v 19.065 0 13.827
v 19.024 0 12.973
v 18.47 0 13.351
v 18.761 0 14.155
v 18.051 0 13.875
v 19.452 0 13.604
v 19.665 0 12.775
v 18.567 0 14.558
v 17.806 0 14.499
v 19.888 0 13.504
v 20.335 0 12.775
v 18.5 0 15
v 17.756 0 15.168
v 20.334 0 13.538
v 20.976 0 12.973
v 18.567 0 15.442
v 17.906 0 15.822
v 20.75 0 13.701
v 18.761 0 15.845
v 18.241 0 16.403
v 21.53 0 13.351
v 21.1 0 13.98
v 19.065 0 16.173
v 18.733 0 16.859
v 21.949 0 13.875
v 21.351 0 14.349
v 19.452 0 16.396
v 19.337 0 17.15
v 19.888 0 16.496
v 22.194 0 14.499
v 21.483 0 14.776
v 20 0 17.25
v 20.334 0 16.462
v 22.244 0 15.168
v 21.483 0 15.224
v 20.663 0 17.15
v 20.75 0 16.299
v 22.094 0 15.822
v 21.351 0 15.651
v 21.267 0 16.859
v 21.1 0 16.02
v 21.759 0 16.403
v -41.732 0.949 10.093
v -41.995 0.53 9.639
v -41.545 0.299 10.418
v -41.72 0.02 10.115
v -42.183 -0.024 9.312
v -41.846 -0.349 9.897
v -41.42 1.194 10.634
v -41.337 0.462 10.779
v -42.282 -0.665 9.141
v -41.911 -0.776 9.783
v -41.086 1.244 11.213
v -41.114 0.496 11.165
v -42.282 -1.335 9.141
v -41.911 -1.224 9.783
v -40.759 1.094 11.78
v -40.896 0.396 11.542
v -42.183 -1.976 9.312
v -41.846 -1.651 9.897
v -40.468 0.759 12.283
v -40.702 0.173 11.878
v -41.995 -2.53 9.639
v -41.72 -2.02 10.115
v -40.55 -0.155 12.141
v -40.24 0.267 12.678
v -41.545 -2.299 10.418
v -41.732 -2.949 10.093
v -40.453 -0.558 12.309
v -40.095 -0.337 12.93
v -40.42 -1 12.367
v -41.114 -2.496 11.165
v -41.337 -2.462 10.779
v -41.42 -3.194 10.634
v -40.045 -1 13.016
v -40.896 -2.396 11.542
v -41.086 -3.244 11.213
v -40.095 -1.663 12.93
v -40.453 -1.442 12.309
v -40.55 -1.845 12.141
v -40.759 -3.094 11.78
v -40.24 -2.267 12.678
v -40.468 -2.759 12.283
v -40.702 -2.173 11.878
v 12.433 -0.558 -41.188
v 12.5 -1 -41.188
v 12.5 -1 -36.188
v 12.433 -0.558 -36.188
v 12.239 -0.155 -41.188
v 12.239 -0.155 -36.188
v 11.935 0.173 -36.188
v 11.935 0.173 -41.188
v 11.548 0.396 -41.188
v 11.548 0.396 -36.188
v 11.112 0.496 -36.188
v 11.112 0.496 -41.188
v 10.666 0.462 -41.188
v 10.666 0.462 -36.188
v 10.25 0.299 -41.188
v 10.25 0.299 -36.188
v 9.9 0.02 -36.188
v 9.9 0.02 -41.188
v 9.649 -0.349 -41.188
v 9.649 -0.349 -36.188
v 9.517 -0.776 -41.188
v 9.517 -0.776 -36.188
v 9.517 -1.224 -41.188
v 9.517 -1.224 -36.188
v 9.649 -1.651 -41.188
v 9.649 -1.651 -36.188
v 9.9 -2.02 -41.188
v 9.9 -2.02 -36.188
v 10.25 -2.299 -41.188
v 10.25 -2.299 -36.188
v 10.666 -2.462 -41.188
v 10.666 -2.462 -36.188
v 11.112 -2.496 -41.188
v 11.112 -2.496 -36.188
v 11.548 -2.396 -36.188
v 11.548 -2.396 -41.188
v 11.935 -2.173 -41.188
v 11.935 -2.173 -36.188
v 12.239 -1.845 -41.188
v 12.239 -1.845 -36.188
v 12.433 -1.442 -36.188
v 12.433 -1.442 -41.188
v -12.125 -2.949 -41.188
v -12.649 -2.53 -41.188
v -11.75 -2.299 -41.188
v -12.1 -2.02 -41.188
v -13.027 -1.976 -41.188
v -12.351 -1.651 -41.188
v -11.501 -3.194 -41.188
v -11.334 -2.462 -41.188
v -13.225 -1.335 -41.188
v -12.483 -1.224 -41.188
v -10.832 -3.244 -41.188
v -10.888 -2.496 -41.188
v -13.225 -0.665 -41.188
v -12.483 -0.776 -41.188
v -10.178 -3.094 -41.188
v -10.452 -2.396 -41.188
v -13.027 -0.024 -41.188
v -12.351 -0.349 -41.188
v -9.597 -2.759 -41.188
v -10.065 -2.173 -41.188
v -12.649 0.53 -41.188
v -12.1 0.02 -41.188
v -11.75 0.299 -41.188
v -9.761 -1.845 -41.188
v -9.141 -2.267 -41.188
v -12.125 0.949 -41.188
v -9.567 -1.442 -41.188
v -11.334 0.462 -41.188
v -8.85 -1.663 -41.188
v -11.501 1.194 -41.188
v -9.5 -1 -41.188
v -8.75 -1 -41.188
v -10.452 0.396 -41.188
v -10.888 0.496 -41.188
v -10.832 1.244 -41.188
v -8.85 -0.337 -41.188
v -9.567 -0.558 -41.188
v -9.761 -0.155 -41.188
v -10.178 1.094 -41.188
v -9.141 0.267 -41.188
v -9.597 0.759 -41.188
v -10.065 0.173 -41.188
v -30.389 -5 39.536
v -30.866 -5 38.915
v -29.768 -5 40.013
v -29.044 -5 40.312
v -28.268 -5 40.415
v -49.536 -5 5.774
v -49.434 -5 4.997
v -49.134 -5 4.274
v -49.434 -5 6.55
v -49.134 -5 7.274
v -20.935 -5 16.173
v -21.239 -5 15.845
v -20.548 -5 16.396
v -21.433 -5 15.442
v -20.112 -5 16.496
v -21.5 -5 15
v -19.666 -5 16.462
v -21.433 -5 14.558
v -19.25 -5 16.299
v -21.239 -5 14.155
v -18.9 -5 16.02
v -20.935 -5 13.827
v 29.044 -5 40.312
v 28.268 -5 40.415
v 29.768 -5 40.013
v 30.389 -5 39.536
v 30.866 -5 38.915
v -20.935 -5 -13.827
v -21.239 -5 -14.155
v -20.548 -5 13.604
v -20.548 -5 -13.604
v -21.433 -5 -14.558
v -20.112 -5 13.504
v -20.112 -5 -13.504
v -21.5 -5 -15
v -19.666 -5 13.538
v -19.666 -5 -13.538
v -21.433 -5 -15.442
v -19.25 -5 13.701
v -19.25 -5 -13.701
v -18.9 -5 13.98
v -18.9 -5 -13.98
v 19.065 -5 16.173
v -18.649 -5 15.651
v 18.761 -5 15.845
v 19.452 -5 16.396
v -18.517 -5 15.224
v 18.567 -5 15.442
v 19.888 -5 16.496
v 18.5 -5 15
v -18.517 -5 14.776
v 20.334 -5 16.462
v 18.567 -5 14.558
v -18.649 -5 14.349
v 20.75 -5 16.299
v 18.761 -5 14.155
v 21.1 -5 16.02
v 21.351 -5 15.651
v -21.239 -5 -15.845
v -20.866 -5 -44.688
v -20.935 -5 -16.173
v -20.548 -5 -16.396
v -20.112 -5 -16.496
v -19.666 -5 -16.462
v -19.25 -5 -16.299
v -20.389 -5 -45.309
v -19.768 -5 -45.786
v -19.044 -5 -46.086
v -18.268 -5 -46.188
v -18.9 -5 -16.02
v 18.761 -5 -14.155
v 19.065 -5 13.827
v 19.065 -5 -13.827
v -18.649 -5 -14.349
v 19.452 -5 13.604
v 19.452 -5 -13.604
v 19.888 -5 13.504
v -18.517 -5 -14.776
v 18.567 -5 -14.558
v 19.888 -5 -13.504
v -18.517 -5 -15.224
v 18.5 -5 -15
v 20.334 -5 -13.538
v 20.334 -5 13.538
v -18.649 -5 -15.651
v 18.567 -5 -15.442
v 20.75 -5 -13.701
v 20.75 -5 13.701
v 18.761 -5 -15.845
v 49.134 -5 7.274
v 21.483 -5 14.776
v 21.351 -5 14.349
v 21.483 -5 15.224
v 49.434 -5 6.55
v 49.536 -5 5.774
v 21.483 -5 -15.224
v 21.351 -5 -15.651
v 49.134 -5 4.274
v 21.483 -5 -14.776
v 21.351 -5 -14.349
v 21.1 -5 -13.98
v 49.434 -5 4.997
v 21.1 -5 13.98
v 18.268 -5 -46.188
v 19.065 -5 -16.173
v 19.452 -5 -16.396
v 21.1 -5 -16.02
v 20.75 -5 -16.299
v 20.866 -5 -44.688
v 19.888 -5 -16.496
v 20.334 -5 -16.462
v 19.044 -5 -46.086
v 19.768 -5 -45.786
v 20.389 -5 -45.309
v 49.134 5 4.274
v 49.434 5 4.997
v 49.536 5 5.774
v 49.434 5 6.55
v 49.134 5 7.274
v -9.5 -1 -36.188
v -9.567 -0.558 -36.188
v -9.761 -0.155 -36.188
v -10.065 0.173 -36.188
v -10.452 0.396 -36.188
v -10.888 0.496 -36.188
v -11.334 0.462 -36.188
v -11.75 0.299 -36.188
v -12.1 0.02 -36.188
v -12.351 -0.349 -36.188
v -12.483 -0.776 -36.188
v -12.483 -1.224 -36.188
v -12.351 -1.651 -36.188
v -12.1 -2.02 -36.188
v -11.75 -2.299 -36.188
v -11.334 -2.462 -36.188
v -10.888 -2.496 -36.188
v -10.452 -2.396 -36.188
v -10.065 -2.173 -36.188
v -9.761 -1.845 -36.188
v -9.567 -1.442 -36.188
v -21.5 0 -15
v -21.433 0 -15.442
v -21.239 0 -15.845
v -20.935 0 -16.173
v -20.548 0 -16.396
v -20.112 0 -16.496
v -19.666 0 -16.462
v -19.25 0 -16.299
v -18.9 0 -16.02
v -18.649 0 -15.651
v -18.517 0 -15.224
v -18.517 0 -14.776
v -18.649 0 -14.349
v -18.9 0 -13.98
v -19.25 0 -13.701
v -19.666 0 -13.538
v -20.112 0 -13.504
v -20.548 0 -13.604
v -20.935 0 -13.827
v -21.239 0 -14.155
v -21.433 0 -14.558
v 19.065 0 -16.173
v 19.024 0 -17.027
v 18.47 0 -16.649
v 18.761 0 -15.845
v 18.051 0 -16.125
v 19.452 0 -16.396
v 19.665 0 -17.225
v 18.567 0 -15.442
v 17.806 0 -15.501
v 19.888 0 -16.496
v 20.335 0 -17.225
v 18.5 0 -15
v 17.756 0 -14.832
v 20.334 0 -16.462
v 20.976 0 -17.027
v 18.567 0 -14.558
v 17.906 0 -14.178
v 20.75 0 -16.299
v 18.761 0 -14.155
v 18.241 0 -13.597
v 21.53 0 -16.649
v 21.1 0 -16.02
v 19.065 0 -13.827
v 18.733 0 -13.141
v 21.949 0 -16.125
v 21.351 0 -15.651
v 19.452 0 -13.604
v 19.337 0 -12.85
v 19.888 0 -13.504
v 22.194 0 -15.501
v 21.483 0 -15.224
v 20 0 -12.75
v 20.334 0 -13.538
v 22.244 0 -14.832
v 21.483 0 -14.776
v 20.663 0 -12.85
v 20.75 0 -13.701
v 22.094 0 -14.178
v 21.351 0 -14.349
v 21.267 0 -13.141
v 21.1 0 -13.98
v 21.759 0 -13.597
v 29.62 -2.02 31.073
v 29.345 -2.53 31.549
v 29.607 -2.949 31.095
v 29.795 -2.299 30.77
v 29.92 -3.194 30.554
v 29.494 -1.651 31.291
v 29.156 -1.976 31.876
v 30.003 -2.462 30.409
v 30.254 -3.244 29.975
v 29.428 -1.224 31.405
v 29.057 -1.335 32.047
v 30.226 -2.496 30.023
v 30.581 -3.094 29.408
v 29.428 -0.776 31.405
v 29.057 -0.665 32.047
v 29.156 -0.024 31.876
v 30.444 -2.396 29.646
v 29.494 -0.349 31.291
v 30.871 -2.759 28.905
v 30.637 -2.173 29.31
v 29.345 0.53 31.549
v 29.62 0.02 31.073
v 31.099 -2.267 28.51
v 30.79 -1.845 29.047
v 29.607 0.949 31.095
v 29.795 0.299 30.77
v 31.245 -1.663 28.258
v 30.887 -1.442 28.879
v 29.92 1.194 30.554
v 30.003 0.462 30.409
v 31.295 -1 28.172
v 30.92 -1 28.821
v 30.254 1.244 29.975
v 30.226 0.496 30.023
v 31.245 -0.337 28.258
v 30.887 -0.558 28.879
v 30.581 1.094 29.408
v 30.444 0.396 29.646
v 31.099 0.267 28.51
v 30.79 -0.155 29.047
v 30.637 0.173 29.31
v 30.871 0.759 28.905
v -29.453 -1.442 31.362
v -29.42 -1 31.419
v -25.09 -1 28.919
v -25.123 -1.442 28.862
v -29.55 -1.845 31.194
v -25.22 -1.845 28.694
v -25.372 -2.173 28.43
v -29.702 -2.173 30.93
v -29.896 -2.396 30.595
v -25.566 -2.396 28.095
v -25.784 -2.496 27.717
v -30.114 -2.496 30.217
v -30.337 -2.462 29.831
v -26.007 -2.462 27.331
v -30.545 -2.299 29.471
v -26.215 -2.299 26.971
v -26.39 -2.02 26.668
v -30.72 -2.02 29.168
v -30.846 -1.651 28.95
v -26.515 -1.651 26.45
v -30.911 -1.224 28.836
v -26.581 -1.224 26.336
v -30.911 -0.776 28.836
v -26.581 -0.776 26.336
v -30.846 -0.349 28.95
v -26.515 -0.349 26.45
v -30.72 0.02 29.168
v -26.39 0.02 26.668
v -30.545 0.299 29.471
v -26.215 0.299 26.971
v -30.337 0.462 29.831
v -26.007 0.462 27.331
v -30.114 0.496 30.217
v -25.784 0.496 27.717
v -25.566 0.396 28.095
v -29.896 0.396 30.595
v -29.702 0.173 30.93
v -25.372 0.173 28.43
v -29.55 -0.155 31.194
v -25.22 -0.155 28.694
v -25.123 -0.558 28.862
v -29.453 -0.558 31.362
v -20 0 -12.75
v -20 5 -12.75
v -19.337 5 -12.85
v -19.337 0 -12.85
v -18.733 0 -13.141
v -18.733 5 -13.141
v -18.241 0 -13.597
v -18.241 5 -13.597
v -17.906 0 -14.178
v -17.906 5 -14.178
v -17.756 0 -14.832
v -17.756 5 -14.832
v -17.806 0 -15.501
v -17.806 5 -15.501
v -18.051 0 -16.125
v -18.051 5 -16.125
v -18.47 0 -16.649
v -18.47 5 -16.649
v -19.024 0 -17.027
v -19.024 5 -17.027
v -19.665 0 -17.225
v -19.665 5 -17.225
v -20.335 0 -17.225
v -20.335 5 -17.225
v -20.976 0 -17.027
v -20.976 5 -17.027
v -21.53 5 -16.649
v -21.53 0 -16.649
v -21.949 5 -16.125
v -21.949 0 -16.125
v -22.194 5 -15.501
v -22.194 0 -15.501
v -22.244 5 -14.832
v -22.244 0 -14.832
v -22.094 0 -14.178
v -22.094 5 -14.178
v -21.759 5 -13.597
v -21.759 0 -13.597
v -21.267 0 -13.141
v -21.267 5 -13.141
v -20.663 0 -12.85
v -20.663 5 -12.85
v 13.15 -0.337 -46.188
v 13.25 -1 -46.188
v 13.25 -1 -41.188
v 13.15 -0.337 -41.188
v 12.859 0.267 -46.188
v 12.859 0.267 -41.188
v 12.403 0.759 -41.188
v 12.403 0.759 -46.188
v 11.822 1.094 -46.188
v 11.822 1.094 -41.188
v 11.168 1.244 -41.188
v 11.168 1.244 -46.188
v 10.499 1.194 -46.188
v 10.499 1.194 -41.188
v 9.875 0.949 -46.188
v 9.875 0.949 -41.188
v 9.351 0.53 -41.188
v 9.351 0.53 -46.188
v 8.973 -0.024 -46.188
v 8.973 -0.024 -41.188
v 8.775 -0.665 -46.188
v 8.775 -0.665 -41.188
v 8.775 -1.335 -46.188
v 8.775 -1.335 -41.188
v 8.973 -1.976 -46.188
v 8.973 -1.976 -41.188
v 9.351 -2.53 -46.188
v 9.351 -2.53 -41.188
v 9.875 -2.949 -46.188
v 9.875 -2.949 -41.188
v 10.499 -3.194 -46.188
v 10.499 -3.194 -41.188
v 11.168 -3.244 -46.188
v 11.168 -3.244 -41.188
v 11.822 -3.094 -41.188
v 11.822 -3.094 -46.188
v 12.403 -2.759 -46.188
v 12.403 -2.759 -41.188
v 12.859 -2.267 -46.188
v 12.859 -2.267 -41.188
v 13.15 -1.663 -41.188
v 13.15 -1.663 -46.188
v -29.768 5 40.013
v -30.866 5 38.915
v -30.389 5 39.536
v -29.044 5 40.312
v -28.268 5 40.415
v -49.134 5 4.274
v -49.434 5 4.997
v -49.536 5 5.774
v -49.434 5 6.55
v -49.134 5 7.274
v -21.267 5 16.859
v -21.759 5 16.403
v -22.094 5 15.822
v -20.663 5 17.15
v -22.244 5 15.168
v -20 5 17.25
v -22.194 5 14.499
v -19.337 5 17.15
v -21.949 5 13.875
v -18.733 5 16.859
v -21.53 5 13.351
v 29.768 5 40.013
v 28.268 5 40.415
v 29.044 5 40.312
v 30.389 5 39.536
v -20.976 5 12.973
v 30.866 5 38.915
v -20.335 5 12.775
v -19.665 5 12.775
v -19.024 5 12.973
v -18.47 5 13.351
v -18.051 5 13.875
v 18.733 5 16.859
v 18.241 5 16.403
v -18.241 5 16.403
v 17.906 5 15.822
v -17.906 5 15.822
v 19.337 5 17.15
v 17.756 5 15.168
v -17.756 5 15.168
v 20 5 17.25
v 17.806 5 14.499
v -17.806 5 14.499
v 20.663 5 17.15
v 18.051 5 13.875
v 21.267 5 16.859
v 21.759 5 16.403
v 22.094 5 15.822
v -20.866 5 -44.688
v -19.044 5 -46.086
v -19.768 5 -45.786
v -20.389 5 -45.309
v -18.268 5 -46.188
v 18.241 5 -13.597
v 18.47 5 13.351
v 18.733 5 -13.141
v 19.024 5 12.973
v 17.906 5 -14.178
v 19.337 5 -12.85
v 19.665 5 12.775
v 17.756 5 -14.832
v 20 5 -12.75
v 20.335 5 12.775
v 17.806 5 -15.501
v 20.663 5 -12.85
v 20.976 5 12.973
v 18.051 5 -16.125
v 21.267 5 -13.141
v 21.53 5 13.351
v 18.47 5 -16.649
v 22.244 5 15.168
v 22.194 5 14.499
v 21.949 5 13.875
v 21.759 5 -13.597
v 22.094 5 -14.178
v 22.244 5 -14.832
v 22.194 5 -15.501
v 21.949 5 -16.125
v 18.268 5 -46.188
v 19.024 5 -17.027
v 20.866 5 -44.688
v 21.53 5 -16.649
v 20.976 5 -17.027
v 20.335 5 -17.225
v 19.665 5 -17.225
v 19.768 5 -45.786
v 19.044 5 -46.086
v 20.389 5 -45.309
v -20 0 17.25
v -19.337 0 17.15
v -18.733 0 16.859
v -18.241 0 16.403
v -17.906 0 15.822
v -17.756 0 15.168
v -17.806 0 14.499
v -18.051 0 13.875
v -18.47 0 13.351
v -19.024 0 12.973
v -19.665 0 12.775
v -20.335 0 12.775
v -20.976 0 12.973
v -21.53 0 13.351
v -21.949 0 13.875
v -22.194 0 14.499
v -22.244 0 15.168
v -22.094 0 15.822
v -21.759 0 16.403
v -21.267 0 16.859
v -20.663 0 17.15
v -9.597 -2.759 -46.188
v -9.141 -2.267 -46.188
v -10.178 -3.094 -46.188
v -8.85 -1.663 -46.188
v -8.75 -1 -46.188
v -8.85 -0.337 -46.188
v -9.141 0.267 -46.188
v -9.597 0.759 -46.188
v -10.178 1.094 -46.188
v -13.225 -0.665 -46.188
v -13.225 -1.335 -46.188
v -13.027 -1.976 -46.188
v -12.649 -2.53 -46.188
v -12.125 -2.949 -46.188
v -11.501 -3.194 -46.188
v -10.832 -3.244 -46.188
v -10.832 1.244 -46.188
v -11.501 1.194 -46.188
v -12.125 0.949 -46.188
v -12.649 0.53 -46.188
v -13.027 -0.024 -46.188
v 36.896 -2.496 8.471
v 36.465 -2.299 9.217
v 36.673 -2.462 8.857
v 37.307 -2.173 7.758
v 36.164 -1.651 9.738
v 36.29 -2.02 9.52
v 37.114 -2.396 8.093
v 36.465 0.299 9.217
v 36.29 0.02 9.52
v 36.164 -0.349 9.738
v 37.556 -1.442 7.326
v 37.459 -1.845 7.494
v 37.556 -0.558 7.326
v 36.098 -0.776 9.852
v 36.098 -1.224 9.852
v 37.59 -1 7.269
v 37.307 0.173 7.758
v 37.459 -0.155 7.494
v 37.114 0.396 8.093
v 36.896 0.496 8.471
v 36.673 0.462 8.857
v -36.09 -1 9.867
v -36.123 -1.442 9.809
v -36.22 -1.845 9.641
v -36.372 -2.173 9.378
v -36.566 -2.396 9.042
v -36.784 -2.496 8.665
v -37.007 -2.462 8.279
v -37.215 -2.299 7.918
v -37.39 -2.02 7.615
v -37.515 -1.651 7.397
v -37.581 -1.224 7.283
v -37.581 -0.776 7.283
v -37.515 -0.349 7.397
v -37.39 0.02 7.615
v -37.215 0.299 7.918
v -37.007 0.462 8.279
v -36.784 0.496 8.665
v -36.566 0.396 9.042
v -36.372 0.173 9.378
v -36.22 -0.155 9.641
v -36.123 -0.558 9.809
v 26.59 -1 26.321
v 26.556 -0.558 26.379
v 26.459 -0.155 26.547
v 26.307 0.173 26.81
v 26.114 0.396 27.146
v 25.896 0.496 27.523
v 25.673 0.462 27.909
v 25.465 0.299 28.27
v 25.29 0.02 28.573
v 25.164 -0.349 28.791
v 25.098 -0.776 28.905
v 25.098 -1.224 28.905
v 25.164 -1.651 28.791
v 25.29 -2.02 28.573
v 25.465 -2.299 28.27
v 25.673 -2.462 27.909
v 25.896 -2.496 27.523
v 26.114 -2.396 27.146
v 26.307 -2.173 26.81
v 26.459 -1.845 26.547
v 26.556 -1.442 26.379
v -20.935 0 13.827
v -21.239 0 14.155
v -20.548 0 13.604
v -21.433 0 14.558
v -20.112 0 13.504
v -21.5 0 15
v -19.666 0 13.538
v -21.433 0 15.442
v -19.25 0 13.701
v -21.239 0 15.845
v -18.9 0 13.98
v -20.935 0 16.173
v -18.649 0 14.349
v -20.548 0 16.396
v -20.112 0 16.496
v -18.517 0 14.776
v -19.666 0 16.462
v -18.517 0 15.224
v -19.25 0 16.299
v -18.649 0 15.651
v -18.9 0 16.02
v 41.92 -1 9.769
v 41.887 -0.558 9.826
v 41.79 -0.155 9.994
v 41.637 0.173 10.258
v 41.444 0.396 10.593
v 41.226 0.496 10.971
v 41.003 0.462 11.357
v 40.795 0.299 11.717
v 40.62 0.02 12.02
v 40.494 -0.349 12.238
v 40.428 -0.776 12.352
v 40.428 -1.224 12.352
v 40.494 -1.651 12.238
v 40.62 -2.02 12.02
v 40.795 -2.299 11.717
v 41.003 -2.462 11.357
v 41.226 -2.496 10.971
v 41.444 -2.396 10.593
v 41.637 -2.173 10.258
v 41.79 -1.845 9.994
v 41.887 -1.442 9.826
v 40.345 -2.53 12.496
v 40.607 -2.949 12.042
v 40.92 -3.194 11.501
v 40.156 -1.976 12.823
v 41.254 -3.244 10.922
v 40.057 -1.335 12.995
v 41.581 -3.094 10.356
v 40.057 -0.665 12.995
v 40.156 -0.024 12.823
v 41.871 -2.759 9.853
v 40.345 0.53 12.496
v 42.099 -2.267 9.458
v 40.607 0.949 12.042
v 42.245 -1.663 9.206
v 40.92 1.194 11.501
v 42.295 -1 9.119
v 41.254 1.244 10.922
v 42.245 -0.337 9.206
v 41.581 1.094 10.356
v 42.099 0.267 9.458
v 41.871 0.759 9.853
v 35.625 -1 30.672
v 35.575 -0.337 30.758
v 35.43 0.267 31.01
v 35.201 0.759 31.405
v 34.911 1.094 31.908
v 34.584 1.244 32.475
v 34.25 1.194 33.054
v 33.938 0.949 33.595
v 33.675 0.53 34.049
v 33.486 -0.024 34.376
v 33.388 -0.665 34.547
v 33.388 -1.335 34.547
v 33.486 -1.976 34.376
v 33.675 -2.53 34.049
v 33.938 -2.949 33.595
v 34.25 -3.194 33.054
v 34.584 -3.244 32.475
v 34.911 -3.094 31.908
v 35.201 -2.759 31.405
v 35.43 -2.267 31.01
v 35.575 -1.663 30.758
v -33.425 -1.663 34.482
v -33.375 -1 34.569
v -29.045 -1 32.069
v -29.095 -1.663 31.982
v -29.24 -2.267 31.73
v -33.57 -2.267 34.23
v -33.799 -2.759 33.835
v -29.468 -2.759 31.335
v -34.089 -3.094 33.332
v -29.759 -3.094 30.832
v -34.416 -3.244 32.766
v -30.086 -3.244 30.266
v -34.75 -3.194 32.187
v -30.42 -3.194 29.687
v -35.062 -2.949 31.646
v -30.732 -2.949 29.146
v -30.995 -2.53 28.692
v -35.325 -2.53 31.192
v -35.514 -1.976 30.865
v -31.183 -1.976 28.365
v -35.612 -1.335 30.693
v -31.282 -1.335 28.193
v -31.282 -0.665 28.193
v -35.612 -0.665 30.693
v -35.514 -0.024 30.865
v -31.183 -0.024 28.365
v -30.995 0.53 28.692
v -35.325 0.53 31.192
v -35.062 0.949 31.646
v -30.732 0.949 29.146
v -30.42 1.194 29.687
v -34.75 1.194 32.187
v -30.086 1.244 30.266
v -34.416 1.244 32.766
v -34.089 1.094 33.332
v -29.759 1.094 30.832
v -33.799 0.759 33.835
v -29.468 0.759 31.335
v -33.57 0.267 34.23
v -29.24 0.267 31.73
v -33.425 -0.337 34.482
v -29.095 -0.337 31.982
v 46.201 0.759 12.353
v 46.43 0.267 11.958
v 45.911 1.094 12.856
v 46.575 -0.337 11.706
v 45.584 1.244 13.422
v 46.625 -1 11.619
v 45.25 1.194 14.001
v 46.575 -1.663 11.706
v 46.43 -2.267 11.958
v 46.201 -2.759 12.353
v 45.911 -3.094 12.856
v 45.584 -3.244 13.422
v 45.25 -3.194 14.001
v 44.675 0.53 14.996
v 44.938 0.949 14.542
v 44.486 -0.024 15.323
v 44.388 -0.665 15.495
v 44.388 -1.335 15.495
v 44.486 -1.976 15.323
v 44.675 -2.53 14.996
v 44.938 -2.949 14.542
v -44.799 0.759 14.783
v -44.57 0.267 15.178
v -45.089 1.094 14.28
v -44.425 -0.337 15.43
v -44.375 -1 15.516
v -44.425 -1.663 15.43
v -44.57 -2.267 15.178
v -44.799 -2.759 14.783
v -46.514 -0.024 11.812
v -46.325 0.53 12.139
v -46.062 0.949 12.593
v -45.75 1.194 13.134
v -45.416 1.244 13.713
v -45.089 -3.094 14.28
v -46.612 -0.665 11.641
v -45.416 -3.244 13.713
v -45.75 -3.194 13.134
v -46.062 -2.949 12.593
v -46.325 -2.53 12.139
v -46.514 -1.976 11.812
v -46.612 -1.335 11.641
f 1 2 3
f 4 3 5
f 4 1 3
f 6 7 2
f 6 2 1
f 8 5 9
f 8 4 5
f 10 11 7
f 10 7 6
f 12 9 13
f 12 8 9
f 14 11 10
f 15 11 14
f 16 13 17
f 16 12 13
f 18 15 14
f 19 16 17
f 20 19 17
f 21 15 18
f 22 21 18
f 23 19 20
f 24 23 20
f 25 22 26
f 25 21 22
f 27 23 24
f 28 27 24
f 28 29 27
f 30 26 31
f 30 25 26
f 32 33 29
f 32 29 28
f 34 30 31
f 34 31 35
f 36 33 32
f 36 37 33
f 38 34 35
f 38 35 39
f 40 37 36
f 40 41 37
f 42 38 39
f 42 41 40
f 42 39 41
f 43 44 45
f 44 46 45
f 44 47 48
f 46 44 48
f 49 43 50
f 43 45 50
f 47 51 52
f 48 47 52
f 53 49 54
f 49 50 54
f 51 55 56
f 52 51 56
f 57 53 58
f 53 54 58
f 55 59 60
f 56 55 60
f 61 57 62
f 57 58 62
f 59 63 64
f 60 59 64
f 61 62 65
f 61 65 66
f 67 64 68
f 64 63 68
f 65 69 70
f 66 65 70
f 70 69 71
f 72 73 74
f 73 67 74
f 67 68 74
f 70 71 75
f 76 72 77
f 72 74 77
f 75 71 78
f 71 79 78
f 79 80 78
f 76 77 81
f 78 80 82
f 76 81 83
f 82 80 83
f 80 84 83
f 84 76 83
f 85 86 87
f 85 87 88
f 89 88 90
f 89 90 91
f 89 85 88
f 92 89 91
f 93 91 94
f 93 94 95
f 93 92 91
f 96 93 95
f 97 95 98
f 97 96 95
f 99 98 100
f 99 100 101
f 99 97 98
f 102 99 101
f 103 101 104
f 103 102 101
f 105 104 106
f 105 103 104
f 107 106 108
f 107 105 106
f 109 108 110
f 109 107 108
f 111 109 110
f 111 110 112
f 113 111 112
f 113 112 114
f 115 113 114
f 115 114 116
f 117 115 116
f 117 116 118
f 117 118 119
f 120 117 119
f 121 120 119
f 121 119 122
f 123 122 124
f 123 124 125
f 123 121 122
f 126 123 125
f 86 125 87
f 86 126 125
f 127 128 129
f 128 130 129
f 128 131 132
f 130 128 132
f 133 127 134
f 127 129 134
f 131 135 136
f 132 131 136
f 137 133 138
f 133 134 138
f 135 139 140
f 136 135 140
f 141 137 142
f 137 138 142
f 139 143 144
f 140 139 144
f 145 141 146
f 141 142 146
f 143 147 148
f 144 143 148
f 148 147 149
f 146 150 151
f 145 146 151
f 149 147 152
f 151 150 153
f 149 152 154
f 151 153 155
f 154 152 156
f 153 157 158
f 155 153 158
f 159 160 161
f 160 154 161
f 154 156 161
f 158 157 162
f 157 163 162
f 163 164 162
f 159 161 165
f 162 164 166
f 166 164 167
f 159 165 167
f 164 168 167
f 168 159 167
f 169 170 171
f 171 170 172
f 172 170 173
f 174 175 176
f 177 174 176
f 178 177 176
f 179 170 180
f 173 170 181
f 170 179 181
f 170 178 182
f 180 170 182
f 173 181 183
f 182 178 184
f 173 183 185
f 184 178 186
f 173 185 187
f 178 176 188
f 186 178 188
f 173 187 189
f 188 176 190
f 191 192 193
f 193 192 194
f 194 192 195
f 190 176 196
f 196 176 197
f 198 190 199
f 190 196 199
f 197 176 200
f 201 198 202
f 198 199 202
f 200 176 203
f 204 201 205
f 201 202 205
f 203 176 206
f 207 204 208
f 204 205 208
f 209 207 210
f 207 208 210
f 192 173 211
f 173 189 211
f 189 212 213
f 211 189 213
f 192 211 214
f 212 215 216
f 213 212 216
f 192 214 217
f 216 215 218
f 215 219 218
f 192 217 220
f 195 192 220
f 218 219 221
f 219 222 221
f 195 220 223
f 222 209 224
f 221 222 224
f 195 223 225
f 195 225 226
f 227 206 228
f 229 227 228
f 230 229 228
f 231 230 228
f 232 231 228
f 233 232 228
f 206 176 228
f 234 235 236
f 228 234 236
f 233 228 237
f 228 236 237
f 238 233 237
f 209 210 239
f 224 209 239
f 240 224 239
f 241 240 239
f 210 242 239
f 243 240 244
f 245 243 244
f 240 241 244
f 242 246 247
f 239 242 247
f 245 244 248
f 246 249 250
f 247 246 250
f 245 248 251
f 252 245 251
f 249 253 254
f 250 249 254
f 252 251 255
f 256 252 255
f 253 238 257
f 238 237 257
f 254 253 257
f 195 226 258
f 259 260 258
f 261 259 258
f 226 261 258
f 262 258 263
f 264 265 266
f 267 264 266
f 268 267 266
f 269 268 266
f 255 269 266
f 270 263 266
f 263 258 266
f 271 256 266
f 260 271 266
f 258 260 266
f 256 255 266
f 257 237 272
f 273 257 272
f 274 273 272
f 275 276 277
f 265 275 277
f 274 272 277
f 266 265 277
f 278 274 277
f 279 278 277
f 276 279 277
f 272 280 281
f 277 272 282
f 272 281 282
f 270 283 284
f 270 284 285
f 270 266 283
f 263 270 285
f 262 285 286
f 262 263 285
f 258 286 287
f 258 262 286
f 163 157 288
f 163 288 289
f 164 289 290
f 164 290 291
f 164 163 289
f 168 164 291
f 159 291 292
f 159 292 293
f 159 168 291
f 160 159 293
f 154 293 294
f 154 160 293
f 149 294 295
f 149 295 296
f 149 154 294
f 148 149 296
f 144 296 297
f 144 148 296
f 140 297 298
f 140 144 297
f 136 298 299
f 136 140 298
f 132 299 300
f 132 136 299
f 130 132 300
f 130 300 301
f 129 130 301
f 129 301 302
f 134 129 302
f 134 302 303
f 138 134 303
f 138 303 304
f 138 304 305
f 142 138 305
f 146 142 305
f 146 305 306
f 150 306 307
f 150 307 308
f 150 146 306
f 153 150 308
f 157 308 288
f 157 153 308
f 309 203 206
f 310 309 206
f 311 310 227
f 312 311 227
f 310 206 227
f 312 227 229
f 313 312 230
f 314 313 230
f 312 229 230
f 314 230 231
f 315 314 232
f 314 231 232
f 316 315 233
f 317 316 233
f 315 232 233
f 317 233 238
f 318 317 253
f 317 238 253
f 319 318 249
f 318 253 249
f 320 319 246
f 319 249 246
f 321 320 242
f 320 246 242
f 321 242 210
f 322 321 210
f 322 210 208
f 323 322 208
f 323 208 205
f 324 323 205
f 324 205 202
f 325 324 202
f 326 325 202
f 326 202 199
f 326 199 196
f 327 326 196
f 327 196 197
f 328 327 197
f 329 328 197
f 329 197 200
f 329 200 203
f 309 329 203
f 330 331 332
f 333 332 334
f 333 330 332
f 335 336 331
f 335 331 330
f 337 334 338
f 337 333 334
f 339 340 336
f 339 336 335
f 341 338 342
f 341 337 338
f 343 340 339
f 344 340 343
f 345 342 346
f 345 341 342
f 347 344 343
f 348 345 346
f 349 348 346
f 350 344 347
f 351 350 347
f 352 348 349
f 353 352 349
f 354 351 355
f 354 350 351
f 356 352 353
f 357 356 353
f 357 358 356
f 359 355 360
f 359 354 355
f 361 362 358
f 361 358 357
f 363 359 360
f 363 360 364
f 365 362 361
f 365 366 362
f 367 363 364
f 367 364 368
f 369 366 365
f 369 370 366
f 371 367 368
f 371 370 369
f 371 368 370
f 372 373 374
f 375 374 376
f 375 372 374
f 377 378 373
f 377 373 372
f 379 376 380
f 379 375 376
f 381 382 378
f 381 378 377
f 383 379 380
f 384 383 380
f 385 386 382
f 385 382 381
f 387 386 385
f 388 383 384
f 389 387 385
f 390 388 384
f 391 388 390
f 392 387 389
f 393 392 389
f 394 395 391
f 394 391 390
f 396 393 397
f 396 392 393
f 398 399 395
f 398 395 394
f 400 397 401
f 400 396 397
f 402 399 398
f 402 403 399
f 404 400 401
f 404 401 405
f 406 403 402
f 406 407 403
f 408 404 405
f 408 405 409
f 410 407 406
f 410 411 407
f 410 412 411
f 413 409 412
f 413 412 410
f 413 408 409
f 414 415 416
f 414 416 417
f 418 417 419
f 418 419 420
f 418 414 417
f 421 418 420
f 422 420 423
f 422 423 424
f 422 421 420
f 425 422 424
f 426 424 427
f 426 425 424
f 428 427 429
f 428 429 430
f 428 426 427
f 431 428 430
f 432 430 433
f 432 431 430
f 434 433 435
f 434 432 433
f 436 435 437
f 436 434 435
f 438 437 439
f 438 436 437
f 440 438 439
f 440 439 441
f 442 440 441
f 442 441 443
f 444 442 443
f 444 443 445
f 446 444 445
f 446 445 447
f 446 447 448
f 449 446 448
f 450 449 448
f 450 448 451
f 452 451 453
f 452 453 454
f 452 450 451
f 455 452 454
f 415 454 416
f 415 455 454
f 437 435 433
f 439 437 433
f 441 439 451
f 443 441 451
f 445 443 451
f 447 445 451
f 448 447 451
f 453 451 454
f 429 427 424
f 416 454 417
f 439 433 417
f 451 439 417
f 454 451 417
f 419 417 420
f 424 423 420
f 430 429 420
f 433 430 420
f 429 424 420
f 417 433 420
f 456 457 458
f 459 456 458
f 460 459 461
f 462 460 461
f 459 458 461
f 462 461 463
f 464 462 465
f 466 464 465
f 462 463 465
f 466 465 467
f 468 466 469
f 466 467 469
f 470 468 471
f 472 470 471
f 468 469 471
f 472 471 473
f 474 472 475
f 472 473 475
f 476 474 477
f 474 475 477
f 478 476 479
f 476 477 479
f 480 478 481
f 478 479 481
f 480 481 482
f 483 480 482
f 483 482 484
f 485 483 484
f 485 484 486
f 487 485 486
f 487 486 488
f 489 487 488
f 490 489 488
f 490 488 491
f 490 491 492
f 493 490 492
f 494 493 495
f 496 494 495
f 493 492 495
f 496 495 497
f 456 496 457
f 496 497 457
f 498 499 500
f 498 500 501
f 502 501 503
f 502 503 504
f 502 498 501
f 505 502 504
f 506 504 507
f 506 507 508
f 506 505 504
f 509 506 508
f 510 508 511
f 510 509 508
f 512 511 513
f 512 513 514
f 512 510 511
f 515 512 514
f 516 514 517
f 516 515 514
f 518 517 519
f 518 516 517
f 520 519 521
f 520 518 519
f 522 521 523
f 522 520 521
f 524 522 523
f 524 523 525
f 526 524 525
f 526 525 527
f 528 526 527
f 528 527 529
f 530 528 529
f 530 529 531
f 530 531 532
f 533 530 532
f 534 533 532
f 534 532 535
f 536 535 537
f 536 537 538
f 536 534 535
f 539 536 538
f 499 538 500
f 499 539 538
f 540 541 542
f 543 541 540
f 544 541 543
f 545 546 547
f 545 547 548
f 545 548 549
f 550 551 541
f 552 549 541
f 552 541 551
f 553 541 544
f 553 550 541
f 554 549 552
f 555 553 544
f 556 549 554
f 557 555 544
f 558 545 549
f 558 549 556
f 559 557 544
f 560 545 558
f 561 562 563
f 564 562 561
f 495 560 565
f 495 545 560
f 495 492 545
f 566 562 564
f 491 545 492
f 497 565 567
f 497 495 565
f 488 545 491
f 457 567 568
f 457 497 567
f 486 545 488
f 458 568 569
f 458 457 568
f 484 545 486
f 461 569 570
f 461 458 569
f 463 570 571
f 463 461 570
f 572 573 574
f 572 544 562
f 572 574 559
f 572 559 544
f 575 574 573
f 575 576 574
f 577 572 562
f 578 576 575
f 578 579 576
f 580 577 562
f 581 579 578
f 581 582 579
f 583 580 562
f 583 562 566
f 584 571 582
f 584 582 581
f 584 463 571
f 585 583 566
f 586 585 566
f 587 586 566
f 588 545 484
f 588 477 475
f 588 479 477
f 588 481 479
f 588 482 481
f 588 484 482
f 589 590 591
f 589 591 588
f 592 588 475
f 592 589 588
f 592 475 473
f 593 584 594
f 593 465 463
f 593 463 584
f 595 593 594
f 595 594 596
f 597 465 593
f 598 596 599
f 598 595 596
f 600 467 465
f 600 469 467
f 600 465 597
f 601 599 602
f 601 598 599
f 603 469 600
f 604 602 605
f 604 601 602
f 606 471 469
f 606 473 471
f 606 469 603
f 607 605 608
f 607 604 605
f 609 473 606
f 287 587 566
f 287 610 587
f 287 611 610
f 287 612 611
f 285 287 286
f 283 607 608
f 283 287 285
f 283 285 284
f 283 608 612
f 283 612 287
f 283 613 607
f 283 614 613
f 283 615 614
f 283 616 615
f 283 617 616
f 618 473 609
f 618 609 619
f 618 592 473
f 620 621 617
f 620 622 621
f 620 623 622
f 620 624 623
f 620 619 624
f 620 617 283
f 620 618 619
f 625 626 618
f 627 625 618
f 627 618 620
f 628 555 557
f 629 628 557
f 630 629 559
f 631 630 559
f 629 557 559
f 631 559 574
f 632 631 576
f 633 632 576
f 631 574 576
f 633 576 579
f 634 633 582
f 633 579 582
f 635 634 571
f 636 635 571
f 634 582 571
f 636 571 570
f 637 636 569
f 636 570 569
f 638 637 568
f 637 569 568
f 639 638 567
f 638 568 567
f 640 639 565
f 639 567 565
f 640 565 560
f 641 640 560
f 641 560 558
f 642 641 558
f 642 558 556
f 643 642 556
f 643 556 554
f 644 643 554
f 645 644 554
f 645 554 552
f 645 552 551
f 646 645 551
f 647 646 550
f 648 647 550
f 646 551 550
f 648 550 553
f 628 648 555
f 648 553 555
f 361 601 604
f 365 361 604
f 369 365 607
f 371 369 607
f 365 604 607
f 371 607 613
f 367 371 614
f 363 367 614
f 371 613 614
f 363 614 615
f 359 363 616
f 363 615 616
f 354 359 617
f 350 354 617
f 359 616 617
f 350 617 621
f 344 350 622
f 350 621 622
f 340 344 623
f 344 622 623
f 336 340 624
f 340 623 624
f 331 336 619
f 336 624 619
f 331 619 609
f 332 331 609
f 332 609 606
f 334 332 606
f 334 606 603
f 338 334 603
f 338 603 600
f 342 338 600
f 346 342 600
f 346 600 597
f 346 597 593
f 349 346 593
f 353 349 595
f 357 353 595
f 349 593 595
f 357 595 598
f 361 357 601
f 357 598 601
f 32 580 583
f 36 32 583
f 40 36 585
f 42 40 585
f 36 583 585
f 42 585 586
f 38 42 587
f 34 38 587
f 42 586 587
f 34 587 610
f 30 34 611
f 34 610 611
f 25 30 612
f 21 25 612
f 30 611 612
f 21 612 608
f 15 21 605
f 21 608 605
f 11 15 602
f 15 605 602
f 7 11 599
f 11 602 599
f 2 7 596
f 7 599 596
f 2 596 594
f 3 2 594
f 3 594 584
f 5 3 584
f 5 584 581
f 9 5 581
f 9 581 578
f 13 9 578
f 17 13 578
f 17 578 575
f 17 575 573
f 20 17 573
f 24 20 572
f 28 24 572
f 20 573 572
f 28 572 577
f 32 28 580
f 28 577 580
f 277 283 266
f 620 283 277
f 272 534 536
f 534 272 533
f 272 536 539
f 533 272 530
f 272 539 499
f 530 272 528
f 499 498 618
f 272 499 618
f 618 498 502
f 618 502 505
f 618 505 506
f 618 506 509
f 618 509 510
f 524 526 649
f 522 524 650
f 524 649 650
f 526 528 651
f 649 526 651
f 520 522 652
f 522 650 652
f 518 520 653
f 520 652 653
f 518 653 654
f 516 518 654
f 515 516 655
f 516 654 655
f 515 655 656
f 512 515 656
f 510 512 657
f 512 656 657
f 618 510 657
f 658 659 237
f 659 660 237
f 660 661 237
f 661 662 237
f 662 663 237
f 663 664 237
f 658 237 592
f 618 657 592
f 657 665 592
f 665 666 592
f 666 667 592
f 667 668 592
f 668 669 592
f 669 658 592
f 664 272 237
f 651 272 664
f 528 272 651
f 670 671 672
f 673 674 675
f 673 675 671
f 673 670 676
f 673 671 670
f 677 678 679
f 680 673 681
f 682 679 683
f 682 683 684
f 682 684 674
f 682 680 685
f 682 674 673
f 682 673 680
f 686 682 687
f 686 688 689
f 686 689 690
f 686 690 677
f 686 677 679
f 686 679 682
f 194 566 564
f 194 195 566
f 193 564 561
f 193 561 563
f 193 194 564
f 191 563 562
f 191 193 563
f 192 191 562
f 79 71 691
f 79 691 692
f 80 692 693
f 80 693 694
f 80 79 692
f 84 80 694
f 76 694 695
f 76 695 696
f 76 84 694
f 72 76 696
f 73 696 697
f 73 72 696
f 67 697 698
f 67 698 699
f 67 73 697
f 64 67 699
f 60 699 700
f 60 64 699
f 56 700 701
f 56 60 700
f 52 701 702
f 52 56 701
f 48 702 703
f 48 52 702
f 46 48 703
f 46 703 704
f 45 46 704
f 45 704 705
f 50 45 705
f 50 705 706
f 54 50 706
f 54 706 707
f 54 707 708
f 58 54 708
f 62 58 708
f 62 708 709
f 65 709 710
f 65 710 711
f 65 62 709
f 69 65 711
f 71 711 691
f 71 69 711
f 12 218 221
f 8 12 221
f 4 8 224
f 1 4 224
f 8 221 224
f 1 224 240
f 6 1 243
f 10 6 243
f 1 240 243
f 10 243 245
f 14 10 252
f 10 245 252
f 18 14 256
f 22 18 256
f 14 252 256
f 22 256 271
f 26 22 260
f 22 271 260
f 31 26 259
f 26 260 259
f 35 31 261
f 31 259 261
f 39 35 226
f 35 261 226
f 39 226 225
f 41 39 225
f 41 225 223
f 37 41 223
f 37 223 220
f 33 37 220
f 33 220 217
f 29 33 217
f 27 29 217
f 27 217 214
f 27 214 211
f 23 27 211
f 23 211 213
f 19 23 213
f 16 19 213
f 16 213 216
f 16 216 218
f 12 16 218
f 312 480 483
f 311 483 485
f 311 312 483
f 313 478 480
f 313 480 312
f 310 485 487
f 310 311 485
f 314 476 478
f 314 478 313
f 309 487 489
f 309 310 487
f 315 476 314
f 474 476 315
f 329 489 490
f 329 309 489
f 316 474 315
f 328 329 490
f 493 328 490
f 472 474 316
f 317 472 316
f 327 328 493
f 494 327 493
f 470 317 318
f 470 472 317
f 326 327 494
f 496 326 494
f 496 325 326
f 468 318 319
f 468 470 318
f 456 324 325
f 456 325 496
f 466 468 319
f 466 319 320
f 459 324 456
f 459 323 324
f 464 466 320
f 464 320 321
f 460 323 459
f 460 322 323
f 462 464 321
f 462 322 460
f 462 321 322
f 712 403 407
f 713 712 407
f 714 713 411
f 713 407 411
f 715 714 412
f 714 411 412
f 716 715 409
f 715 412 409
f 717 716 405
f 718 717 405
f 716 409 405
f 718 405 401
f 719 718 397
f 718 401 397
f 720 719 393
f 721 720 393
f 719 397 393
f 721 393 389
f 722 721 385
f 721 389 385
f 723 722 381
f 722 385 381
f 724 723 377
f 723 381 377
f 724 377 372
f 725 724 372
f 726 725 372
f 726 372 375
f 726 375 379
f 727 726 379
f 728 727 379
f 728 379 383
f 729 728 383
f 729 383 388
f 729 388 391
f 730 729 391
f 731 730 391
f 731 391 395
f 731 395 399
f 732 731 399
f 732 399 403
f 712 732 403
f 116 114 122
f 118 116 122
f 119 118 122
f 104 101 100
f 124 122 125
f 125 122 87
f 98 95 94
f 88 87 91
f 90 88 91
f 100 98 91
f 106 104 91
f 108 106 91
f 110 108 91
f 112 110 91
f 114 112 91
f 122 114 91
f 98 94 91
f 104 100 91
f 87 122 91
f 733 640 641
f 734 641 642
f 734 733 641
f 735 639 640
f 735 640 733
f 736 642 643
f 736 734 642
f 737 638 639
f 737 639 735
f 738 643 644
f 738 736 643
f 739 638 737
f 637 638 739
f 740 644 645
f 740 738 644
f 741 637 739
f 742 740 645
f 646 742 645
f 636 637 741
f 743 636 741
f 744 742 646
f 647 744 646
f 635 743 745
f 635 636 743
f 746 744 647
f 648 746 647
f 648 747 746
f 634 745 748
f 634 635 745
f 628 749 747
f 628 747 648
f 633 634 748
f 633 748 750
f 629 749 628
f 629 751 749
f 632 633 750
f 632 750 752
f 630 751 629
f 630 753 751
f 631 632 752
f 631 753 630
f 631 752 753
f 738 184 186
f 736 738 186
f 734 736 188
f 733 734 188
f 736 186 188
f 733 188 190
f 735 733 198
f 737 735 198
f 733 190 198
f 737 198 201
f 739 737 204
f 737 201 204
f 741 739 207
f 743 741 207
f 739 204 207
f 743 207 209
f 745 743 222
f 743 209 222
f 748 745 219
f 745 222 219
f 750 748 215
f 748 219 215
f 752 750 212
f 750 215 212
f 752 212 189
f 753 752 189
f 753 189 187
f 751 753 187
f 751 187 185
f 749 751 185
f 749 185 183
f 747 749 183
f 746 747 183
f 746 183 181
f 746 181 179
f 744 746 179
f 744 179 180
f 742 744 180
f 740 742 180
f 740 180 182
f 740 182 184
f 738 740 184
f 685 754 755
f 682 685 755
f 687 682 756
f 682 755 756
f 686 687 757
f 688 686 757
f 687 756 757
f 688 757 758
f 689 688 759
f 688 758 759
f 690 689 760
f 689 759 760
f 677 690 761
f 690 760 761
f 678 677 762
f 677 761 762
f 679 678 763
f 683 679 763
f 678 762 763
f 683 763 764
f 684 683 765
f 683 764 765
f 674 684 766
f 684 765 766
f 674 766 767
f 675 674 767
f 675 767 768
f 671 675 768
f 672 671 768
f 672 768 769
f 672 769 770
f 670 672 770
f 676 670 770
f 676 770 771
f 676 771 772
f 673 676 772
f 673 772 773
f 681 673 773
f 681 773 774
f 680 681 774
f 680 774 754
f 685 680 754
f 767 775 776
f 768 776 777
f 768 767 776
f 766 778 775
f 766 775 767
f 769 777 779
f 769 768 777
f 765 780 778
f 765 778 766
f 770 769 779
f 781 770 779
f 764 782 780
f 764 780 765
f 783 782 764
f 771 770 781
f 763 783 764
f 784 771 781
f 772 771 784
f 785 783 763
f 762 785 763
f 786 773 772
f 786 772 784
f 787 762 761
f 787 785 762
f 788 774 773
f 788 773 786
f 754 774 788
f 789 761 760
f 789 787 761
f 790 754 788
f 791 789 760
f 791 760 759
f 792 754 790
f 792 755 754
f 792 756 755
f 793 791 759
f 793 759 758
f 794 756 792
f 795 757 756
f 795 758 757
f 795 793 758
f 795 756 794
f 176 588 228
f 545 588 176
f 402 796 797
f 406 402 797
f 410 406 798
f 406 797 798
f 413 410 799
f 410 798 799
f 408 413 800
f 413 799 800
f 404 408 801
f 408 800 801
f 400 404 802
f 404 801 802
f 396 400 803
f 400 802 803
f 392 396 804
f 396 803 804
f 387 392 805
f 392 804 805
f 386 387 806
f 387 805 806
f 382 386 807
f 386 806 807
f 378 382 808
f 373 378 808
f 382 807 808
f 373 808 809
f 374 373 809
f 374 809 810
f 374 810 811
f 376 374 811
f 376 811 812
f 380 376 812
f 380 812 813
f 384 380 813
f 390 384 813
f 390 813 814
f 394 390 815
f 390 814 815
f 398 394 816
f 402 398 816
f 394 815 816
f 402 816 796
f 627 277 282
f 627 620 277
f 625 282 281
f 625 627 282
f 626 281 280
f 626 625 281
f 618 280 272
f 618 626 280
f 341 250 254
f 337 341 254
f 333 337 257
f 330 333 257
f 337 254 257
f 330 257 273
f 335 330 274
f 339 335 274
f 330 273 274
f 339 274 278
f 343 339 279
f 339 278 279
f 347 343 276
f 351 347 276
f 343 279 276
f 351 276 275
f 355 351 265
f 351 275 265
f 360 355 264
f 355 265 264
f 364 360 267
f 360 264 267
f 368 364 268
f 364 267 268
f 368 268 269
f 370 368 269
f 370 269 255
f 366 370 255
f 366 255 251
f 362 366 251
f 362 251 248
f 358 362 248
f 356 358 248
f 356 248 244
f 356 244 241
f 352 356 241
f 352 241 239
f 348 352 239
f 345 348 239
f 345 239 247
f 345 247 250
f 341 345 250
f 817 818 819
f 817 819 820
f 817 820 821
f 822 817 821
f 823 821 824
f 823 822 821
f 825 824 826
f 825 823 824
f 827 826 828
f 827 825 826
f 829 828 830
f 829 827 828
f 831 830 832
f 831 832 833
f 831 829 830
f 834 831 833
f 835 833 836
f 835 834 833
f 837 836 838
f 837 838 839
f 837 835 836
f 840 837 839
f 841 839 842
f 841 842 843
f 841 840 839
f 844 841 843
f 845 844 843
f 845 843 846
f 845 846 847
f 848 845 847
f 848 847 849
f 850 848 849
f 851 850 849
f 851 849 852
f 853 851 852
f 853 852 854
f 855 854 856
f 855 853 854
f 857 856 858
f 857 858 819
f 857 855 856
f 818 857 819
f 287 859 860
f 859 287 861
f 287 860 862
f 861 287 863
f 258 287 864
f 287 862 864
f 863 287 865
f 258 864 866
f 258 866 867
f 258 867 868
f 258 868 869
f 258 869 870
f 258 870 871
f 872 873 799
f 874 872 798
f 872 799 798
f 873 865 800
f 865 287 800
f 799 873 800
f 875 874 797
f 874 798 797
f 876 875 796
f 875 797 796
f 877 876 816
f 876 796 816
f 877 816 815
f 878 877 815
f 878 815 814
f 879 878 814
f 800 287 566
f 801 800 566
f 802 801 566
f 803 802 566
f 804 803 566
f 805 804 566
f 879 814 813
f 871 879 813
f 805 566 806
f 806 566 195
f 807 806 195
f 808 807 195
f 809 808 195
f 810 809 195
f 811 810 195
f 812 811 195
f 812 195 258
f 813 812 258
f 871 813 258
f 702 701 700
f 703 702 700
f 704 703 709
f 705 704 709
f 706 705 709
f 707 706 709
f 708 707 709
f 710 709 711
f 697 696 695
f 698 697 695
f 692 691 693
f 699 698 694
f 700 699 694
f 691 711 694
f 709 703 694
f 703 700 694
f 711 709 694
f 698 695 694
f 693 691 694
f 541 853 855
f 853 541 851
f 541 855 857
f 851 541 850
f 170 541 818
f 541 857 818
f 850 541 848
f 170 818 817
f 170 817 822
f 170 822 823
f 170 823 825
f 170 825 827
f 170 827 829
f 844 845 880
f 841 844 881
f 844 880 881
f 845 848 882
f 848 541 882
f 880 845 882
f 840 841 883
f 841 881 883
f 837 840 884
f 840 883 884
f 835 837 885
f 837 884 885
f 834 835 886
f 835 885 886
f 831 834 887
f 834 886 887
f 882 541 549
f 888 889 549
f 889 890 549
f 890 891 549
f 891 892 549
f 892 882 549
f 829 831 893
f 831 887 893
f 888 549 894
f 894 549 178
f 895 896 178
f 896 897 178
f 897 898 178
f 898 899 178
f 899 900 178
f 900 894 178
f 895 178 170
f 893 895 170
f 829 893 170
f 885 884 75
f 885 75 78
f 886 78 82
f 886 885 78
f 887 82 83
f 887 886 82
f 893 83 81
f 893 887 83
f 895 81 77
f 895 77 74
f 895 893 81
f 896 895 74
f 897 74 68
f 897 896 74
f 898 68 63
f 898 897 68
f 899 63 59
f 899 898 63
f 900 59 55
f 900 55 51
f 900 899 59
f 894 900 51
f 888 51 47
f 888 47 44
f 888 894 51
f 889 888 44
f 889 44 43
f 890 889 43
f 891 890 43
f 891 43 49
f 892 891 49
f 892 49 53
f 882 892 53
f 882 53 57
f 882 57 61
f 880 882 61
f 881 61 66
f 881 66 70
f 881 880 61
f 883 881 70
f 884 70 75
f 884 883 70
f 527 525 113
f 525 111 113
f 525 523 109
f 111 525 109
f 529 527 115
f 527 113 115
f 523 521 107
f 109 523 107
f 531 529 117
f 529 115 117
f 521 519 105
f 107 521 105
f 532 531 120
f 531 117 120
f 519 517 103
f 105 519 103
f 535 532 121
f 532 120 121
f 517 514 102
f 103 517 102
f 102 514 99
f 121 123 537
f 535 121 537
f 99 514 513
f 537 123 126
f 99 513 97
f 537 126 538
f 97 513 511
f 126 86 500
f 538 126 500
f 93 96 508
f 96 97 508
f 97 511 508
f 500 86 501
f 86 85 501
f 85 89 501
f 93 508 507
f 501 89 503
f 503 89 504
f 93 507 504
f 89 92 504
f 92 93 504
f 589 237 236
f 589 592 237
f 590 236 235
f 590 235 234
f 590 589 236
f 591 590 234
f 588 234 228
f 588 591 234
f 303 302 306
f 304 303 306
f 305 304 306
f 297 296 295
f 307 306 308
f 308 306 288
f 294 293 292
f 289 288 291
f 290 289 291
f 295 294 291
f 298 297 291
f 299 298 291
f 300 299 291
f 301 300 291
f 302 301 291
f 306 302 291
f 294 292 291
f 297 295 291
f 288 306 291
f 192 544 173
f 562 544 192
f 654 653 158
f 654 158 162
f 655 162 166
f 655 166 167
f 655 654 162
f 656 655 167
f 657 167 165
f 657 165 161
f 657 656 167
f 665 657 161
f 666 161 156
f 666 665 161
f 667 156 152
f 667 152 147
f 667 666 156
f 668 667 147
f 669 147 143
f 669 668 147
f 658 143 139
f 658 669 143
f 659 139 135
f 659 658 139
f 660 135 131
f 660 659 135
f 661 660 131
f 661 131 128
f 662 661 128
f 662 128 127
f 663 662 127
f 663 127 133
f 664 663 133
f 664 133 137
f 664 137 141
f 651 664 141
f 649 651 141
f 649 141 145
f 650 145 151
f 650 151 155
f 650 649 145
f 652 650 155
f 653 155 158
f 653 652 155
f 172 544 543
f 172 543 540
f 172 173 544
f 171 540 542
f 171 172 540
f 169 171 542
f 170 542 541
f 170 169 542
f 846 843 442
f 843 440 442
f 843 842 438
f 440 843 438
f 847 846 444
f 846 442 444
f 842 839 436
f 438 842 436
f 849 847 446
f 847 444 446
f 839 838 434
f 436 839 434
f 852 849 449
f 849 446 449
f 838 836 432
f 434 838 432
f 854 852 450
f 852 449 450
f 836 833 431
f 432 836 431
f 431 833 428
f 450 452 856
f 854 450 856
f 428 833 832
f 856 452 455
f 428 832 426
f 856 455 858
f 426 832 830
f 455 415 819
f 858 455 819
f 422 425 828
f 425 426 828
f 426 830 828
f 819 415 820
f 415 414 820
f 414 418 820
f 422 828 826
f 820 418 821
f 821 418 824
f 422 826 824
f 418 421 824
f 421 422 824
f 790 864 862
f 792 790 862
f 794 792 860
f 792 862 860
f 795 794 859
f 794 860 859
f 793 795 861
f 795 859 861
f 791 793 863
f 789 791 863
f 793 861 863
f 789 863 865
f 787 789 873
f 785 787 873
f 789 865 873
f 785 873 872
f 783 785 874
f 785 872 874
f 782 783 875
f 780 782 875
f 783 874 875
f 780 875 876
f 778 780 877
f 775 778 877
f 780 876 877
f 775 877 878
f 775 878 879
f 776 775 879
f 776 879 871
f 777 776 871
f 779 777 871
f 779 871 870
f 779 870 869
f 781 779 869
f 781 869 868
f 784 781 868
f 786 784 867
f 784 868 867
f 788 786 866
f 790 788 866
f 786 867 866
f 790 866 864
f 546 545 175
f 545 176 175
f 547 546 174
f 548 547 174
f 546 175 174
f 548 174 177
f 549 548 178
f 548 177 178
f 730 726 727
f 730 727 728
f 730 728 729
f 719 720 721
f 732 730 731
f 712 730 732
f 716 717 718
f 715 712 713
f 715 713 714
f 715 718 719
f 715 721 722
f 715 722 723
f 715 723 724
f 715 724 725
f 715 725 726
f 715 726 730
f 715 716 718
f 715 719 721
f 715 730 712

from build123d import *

# Parameters (mm, degrees)
BOSS_EXTRUDE1_DEPTH     = 5
CHAMFER1_SIZE           = 40
SKETCH4_R               = 1.5
CUT_EXTRUDE1_DEPTH      = 10
SKETCH10_R              = 2.25
CUT_EXTRUDE3_DEPTH      = 5
CRVPATTERN1_START       = -46.188021535
CRVPATTERN1_OUTLINE_R   = 2.25
CRVPATTERN1_DEPTH       = 5
CRVPATTERN1_START_2     = -41.188021535
CRVPATTERN1_2_OUTLINE_R = 1.5
CRVPATTERN1_2_DEPTH     = 5
CRVPATTERN1_3_OUTLINE_R = 2.25
CRVPATTERN1_3_DEPTH     = 5
CRVPATTERN1_4_OUTLINE_R = 1.5
CRVPATTERN1_4_DEPTH     = 5
F_3_0MM_DOWEL_HOLE1_D   = 3
SKETCH9_R               = 2.25
CUT_EXTRUDE2_DEPTH      = 5
FILLET1_R               = 3


# Read off the part's stored shape, not the designer's step: CrvPattern1
with BuildPart() as part:
    # Sketch2 → Boss-Extrude1 (new, symmetric)
    with BuildSketch(Plane(origin=(0, 0, 0), x_dir=(1, 0, 0), z_dir=(0, 1, 0))):
        Polygon((70, -40.414518843), (0, 80.829037687), (-70, -40.414518843), align=None)
    extrude(amount=BOSS_EXTRUDE1_DEPTH, both=True)

    # Chamfer1
    chamfer1_edges = [part.edges().sort_by_distance(p)[0] for p in [
        (-70, 0, 40.414518843),
        (0, 0, -80.829037687),
        (70, 0, 40.414518843),
    ]]
    chamfer(chamfer1_edges, length=CHAMFER1_SIZE)

    # Sketch4 → Cut-Extrude1 (cut)
    with BuildSketch(Plane(origin=(40, 0, 23.094010768), x_dir=(0.5000000000000004, 0, -0.8660254037844384), z_dir=(0.8660254037844384, 0, 0.5000000000000004))):
        with Locations((-11, -1)):
            Circle(SKETCH4_R)
        with Locations((11, -1)):
            Circle(SKETCH4_R)
    extrude(amount=-CUT_EXTRUDE1_DEPTH, mode=Mode.SUBTRACT)

    # Sketch10 → Cut-Extrude3 (cut)
    with BuildSketch(Plane(origin=(40, 0, 23.094010768), x_dir=(0.4999999999999997, 0, -0.8660254037844388), z_dir=(0.8660254037844389, 0, 0.49999999999999983))):
        with Locations((-11, -1)):
            Circle(SKETCH10_R)
        with Locations((11, -1)):
            Circle(SKETCH10_R)
    extrude(amount=-CUT_EXTRUDE3_DEPTH, mode=Mode.SUBTRACT)

    # CrvPattern1 outline → CrvPattern1 (cut)
    with BuildSketch(Plane.XY.offset(CRVPATTERN1_START)):
        with Locations((11, -1)):
            Circle(CRVPATTERN1_OUTLINE_R)
        with Locations((-11, -1)):
            Circle(CRVPATTERN1_OUTLINE_R)
    extrude(amount=CRVPATTERN1_DEPTH, mode=Mode.SUBTRACT)

    # CrvPattern1 2 outline → CrvPattern1 2 (cut)
    with BuildSketch(Plane.XY.offset(CRVPATTERN1_START_2)):
        with Locations((11, -1)):
            Circle(CRVPATTERN1_2_OUTLINE_R)
        with Locations((-11, -1)):
            Circle(CRVPATTERN1_2_OUTLINE_R)
    extrude(amount=CRVPATTERN1_2_DEPTH, mode=Mode.SUBTRACT)

    # CrvPattern1 3 outline → CrvPattern1 3 (cut)
    with BuildSketch(Plane(origin=(0, 0, 0), x_dir=(0.500000000000013, 0, 0.8660254037844313), z_dir=(0.8660254037844312, 0, -0.5000000000000131)).offset(CRVPATTERN1_START)):
        with Locations((-11, 1)):
            Circle(CRVPATTERN1_3_OUTLINE_R)
        with Locations((11, 1)):
            Circle(CRVPATTERN1_3_OUTLINE_R)
    extrude(amount=CRVPATTERN1_3_DEPTH, mode=Mode.SUBTRACT)

    # CrvPattern1 4 outline → CrvPattern1 4 (cut)
    with BuildSketch(Plane(origin=(0, 0, 0), x_dir=(0.500000000000013, 0, 0.8660254037844313), z_dir=(0.8660254037844312, 0, -0.5000000000000131)).offset(CRVPATTERN1_START_2)):
        with Locations((-11, 1)):
            Circle(CRVPATTERN1_4_OUTLINE_R)
        with Locations((11, 1)):
            Circle(CRVPATTERN1_4_OUTLINE_R)
    extrude(amount=CRVPATTERN1_4_DEPTH, mode=Mode.SUBTRACT)

    # Ø3.0mm Dowel Hole1 (through all)
    with Locations(Plane(origin=(0, 5, 0), x_dir=(1, 0, 0), z_dir=(0, 1, 0))):
        with Locations((-20, 15), (20, 15), (20, -15), (-20, -15)):
            Hole(F_3_0MM_DOWEL_HOLE1_D / 2)

    # Sketch9 → Cut-Extrude2 (cut)
    with BuildSketch(Plane(origin=(0, 5, 0), x_dir=(1, 0, 0), z_dir=(0, 1, 0))):
        with Locations(Location((-20, 15, 0), (0, 0, 270))):
            Circle(SKETCH9_R)
        with Locations(Location((20, 15, 0), (0, 0, 270))):
            Circle(SKETCH9_R)
        with Locations(Location((20, -15, 0), (0, 0, 270))):
            Circle(SKETCH9_R)
        with Locations(Location((-20, -15, 0), (0, 0, 270))):
            Circle(SKETCH9_R)
    extrude(amount=-CUT_EXTRUDE2_DEPTH, mode=Mode.SUBTRACT)

    # Fillet1
    fillet1_edges = [part.edges().sort_by_distance(p)[0] for p in [
        (20, 0, -46.188021535),
        (50, 0, 5.773502692),
        (-30, 0, 40.414518843),
        (30, 0, 40.414518843),
        (-50, 0, 5.773502692),
        (-20, 0, -46.188021535),
    ]]
    fillet(fillet1_edges, radius=FILLET1_R)


solid = part.part
